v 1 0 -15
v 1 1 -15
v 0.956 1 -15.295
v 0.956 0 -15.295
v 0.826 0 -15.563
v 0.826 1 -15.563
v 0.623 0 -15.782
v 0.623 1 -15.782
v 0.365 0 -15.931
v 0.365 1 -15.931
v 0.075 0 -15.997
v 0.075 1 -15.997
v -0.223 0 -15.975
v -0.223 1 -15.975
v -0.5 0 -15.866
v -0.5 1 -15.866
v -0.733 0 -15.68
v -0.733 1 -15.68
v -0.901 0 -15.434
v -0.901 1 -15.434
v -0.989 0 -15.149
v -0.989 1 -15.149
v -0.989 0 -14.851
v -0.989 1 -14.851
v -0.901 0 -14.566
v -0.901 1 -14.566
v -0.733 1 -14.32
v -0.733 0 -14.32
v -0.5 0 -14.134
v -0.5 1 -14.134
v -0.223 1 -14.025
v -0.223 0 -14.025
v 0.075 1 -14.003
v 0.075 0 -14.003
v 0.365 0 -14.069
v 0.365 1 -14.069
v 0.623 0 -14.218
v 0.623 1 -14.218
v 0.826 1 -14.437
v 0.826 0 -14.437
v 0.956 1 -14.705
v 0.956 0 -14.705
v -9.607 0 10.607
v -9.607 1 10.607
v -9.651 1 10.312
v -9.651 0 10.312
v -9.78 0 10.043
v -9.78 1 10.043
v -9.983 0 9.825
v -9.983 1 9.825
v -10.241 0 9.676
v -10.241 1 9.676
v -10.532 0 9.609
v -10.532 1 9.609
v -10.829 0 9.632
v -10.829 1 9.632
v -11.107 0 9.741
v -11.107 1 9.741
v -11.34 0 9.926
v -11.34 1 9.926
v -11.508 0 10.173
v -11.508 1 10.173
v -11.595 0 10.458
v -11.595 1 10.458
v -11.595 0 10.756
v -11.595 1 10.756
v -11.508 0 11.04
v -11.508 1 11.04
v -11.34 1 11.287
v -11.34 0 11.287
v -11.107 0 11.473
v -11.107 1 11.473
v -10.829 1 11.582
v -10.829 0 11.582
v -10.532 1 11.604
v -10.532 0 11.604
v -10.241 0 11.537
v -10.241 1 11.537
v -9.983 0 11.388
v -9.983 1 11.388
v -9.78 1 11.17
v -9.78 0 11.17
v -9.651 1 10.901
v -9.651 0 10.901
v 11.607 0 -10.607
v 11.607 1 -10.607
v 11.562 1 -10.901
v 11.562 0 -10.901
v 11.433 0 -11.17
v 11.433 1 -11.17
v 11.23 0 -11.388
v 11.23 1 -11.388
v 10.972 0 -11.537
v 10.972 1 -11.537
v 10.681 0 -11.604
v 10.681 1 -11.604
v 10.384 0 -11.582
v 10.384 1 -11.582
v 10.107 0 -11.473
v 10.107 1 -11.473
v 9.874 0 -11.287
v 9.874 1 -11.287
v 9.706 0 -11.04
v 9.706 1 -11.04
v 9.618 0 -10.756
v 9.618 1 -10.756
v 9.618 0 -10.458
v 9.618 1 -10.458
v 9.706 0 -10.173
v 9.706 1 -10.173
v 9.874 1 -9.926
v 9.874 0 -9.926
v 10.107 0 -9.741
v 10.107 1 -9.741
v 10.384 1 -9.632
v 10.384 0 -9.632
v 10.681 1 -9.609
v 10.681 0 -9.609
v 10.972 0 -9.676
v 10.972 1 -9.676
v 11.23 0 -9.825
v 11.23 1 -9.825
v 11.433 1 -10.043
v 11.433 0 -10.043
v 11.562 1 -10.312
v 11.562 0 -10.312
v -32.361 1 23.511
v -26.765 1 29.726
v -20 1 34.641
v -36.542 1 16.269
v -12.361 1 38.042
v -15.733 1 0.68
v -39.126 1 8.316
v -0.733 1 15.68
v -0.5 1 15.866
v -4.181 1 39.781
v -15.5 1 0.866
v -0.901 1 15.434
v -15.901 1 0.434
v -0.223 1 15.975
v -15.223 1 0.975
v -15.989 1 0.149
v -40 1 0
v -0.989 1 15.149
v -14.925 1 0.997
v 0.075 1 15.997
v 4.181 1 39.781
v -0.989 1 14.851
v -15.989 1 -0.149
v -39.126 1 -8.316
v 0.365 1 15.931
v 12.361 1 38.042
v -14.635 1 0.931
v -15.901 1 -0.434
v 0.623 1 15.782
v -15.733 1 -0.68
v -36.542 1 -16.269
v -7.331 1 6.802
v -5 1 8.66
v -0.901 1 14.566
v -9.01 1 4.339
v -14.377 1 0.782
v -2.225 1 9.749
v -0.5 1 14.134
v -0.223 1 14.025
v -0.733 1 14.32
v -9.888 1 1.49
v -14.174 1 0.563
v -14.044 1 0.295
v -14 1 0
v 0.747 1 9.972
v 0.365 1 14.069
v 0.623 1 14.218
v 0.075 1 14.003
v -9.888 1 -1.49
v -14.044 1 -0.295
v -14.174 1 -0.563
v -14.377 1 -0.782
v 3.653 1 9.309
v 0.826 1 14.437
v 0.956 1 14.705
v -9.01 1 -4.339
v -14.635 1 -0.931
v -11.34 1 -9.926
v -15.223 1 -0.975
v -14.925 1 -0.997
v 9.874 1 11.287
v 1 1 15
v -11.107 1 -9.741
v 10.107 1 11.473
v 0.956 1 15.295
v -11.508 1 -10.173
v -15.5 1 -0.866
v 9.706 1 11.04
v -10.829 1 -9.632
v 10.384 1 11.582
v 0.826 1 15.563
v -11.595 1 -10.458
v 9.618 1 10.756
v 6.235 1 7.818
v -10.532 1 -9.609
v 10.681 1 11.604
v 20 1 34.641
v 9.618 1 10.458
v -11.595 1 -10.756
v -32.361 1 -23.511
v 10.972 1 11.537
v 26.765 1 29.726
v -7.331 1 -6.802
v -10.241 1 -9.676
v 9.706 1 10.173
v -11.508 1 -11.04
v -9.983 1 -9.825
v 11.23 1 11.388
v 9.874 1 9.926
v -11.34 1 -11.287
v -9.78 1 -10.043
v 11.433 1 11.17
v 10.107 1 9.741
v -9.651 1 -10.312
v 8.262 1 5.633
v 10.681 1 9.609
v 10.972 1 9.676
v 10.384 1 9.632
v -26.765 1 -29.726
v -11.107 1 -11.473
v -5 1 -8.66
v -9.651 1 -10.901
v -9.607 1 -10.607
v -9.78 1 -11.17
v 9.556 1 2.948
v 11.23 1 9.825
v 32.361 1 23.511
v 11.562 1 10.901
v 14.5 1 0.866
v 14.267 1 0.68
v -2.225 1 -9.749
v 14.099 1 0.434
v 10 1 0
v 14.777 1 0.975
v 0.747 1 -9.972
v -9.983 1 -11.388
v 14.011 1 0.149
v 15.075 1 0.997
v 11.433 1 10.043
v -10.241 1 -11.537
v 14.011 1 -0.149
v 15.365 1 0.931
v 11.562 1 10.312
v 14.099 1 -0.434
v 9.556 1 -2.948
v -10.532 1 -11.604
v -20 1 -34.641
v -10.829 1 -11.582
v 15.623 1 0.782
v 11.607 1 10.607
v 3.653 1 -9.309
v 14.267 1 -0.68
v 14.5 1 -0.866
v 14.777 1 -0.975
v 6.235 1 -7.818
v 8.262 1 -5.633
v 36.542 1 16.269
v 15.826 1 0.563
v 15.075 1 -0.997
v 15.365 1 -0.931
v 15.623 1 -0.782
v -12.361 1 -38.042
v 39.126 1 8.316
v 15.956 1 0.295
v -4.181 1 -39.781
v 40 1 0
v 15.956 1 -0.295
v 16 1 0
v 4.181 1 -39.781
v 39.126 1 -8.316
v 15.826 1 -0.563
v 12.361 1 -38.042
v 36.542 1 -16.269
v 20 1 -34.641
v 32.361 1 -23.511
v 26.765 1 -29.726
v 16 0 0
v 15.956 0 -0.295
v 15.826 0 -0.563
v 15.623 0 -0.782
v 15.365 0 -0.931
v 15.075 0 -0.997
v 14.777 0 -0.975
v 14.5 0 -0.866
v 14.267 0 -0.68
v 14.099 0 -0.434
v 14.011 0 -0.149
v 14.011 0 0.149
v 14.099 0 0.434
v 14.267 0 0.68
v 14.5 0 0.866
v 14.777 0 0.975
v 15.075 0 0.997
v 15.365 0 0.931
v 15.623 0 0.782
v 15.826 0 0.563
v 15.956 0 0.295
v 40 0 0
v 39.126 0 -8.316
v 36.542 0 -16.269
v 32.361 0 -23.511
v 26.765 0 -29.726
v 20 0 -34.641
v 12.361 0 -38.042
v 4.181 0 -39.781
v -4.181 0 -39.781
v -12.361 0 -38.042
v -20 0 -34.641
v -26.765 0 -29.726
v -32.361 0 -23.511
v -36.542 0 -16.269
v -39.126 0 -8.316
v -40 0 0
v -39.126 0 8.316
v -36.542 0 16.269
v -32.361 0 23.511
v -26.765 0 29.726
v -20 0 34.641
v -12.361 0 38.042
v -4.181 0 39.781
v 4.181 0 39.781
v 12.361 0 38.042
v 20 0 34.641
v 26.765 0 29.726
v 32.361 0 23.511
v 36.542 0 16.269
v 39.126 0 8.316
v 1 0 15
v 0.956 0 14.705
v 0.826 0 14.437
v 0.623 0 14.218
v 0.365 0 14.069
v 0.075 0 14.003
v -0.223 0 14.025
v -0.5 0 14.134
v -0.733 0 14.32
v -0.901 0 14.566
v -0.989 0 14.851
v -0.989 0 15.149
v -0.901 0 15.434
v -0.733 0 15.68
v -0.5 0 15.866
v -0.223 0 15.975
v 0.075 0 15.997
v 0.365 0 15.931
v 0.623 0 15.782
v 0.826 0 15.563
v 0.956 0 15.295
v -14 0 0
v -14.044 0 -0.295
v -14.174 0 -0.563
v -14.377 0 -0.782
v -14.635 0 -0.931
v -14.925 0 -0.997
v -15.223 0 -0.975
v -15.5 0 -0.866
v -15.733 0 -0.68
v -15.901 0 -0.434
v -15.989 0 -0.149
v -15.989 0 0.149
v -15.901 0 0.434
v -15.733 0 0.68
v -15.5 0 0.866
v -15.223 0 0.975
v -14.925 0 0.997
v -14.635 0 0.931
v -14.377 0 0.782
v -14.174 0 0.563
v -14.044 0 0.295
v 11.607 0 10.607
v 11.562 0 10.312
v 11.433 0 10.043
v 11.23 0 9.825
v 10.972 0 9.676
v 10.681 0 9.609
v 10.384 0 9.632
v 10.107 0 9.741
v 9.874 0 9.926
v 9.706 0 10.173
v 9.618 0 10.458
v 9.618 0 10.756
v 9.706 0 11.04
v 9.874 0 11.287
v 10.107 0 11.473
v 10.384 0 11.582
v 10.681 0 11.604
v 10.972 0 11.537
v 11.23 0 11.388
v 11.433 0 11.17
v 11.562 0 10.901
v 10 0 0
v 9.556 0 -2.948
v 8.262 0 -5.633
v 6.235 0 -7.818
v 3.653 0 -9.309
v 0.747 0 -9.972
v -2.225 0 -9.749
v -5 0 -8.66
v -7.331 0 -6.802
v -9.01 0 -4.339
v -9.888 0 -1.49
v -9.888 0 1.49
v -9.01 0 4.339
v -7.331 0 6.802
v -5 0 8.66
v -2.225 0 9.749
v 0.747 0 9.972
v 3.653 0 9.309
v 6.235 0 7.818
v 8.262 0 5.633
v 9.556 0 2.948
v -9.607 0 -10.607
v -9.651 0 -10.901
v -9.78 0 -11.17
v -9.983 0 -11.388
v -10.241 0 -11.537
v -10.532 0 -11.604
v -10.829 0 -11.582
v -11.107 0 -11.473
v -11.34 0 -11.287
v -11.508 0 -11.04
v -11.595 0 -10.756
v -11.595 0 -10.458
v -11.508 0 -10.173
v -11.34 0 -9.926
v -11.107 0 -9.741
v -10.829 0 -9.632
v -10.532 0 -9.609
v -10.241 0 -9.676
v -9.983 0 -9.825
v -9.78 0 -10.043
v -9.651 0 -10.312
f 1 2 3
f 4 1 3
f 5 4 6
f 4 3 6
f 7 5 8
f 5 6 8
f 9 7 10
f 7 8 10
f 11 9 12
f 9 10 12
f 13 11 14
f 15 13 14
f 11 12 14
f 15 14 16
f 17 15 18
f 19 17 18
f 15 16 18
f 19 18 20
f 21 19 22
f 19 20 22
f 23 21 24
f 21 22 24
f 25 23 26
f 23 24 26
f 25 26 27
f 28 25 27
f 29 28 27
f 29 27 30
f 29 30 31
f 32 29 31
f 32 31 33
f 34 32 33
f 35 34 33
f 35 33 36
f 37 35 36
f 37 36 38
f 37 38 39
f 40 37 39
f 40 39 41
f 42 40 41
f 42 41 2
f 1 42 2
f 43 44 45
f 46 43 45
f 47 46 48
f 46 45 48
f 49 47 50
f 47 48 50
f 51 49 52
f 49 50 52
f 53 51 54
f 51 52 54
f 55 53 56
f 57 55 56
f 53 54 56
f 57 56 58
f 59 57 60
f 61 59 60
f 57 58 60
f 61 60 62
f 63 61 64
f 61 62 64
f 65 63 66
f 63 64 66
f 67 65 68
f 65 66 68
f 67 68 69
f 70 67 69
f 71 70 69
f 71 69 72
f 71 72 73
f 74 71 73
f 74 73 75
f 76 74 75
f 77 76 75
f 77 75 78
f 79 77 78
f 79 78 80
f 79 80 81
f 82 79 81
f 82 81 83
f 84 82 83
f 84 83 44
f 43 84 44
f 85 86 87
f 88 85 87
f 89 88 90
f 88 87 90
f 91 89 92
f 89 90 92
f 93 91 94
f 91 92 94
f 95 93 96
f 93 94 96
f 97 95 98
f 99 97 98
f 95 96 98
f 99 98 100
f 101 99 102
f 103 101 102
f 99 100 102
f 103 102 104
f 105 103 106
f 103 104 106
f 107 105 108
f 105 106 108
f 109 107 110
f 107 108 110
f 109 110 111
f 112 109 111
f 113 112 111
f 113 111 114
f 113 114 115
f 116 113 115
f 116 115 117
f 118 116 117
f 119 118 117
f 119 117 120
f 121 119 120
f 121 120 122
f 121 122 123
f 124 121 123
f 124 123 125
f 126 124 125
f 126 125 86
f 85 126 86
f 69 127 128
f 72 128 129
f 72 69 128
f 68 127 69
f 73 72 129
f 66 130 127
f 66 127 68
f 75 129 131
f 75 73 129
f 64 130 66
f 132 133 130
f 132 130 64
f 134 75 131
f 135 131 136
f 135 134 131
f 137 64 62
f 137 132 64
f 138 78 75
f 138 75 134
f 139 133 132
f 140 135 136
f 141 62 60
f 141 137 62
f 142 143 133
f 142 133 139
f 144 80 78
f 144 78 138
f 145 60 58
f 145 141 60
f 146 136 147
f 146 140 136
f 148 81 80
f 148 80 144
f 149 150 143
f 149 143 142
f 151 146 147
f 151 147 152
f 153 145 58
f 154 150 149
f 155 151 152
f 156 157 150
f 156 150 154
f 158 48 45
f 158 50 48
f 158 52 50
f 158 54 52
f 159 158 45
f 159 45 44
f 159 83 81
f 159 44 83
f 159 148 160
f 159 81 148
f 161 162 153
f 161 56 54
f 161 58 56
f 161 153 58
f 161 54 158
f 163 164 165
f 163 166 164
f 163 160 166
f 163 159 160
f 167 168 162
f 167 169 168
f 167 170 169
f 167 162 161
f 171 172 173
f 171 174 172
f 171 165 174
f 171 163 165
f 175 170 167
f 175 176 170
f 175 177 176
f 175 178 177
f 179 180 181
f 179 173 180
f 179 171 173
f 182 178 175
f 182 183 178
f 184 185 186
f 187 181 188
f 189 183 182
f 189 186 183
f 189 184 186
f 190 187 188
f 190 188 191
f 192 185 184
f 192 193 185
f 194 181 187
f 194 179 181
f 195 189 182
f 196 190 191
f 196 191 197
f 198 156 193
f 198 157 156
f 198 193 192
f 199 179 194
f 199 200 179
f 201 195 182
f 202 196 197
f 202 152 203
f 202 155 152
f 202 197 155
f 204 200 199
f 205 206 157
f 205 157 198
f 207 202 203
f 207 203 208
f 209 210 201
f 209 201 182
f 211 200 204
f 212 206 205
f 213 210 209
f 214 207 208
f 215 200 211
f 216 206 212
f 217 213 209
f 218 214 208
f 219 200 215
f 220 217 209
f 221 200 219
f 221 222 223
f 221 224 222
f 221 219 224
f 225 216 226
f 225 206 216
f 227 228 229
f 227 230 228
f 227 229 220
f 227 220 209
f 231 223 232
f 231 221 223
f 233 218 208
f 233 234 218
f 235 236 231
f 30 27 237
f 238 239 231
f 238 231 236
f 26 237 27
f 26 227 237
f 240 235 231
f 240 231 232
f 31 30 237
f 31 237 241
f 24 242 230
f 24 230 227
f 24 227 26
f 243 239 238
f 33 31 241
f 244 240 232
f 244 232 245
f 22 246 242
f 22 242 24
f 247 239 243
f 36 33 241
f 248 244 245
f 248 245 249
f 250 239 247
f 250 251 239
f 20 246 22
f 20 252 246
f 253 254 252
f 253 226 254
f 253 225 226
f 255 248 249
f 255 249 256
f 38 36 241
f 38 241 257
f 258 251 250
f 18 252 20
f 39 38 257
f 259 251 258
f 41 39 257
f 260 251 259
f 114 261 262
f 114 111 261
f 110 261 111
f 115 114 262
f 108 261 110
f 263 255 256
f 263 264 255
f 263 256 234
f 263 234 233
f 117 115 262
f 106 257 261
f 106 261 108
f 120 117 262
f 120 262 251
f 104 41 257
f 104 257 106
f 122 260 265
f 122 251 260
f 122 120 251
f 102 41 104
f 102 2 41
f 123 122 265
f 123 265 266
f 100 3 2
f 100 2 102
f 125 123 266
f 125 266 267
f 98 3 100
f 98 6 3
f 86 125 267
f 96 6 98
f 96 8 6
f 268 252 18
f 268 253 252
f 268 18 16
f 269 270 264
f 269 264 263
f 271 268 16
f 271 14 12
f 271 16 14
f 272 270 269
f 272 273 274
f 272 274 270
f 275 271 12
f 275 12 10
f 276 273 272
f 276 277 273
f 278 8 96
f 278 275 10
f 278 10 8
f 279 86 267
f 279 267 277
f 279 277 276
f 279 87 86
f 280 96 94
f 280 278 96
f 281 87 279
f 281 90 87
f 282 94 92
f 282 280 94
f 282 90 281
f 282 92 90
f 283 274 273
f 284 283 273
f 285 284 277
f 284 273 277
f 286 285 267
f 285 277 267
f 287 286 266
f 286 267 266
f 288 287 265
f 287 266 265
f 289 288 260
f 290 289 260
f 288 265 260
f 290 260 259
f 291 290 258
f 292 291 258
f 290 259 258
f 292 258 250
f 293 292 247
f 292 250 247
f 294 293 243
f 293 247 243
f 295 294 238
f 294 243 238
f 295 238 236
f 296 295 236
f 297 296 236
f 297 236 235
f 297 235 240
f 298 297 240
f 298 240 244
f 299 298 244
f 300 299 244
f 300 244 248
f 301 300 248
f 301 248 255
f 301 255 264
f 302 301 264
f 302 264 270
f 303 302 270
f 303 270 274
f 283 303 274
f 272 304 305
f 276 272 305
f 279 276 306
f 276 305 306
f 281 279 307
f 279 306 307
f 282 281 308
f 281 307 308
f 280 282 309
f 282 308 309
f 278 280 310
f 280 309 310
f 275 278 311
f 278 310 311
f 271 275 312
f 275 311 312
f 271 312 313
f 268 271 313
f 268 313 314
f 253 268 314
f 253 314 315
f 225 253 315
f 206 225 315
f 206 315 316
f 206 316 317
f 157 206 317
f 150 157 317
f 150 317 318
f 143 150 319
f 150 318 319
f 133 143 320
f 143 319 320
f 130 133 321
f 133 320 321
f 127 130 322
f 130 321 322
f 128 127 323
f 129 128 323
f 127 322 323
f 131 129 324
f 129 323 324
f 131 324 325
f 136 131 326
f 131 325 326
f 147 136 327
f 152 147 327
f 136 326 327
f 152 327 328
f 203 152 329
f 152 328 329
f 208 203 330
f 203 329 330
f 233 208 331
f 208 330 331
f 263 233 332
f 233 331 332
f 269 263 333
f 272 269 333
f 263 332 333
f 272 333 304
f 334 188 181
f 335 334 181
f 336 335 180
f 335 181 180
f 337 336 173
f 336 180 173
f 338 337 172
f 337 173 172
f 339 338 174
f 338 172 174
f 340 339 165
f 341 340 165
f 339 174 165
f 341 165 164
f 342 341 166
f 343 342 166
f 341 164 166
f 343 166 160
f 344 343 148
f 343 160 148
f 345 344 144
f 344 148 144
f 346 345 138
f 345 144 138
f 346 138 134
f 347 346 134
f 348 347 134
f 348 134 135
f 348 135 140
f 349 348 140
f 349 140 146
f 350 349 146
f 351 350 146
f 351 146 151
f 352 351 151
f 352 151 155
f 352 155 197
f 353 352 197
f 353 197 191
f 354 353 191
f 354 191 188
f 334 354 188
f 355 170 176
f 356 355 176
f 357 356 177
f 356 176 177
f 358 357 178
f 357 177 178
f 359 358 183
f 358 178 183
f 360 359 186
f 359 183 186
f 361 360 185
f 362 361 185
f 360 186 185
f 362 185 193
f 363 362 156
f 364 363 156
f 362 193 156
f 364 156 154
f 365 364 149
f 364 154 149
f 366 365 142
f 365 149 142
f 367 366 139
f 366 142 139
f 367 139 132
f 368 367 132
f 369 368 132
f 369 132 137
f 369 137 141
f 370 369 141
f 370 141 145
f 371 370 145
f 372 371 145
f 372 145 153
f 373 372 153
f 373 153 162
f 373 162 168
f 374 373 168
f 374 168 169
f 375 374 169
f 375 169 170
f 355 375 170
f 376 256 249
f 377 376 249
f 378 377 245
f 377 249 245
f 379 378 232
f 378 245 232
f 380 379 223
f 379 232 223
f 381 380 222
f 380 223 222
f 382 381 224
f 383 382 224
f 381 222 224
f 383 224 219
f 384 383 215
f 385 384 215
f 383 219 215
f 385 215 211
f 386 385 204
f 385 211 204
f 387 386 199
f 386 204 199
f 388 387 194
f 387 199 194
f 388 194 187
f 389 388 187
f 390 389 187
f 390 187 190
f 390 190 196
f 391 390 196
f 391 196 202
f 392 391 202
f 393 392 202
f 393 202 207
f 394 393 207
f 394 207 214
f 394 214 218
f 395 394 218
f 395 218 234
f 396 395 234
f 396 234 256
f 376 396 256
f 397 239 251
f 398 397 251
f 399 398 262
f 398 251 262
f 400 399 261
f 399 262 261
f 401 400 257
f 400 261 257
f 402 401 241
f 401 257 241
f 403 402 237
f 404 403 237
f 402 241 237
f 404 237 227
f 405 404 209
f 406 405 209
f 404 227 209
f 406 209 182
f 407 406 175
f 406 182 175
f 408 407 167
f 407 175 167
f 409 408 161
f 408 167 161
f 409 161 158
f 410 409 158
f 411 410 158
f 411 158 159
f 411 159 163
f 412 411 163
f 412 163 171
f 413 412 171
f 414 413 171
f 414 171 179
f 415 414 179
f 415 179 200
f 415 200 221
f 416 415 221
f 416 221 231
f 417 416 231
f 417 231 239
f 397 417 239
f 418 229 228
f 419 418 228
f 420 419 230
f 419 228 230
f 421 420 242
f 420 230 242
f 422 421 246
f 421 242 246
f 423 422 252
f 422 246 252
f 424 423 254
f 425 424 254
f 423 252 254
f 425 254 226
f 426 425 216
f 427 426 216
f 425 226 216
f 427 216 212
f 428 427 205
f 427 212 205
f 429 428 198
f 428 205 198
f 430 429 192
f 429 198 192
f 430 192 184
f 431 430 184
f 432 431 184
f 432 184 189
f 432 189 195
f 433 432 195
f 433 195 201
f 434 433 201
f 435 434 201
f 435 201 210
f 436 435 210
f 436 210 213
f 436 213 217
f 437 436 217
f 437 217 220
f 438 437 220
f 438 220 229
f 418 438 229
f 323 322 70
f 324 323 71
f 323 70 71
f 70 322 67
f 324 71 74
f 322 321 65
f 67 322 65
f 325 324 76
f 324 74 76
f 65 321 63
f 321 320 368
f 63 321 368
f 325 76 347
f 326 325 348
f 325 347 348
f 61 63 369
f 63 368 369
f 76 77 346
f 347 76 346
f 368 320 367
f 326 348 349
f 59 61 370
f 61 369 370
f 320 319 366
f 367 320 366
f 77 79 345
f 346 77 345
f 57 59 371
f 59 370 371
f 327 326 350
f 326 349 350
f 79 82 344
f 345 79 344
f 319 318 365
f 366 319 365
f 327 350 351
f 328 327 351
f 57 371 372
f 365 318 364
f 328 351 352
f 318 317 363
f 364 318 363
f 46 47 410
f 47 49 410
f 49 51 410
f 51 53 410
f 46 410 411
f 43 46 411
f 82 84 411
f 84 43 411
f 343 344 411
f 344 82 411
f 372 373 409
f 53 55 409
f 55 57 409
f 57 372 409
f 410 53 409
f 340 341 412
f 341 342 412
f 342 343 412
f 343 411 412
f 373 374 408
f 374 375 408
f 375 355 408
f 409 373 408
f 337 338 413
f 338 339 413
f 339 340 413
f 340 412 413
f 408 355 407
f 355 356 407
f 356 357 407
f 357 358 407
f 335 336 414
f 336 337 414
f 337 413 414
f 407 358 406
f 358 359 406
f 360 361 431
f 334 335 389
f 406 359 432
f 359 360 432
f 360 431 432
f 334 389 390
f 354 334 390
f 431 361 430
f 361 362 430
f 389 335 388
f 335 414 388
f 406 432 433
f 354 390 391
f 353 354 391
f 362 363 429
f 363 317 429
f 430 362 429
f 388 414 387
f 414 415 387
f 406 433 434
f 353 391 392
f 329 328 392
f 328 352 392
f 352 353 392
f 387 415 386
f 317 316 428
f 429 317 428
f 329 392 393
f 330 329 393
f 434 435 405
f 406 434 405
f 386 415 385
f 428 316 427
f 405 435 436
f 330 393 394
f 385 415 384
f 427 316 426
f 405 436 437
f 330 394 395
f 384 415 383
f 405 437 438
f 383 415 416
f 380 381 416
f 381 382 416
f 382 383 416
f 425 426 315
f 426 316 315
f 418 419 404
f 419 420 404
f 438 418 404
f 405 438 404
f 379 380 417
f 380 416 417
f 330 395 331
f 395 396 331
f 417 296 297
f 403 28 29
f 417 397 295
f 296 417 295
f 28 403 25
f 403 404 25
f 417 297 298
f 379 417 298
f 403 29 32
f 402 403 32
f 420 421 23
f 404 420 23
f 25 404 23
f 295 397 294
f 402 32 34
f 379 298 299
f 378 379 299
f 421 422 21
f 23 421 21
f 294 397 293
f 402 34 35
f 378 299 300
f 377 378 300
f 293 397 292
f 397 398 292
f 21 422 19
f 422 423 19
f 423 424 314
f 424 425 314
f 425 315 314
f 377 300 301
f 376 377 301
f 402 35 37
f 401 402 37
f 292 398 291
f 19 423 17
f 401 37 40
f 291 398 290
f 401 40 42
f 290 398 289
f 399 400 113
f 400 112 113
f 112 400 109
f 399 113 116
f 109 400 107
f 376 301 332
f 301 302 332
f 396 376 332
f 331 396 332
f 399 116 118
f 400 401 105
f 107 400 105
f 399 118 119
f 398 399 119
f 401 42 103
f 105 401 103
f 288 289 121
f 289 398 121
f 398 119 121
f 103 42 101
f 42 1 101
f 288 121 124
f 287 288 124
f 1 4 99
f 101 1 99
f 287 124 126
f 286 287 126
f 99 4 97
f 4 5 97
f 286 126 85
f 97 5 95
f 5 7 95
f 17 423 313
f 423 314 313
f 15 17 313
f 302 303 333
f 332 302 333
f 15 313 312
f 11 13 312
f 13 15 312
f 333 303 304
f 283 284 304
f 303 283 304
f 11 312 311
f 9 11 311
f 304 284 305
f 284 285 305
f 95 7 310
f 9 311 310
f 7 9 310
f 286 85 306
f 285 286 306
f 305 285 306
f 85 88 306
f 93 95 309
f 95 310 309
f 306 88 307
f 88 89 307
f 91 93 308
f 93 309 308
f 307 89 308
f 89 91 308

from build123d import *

# Parameters (mm, degrees)
SKETCH2_R           = 40
BOSS_EXTRUDE1_DEPTH = 1
SKETCH3_R           = 10
CUT_EXTRUDE1_DEPTH  = 2
SKETCH4_R           = 1
CUT_EXTRUDE2_DEPTH  = 2


with BuildPart() as part:
    # Sketch2 → Boss-Extrude1 (new body)
    with BuildSketch(Plane(origin=(0, 0, 0), x_dir=(1, 0, 0), z_dir=(0, 1, 0))):
        Circle(SKETCH2_R)
    extrude(amount=BOSS_EXTRUDE1_DEPTH)

    # Sketch3 → Cut-Extrude1 (cut, through all)
    with BuildSketch(Plane(origin=(0, 1, 0), x_dir=(1, 0, 0), z_dir=(0, 1, 0))):
        Circle(SKETCH3_R)
    extrude(amount=-CUT_EXTRUDE1_DEPTH, mode=Mode.SUBTRACT)

    # Sketch4 → Cut-Extrude2 (cut, through all)
    with BuildSketch(Plane(origin=(0, 1, 0), x_dir=(1, 0, 0), z_dir=(0, 1, 0))):
        with Locations((0, 15)):
            Circle(SKETCH4_R)
        with Locations((10.606601718, 10.606601718)):
            Circle(SKETCH4_R)
        with Locations((15, 0)):
            Circle(SKETCH4_R)
        with Locations((10.606601718, -10.606601718)):
            Circle(SKETCH4_R)
        with Locations((0, -15)):
            Circle(SKETCH4_R)
        with Locations((-10.606601718, -10.606601718)):
            Circle(SKETCH4_R)
        with Locations((-15, 0)):
            Circle(SKETCH4_R)
        with Locations((-10.606601718, 10.606601718)):
            Circle(SKETCH4_R)
    extrude(amount=-CUT_EXTRUDE2_DEPTH, mode=Mode.SUBTRACT)


solid = part.part
